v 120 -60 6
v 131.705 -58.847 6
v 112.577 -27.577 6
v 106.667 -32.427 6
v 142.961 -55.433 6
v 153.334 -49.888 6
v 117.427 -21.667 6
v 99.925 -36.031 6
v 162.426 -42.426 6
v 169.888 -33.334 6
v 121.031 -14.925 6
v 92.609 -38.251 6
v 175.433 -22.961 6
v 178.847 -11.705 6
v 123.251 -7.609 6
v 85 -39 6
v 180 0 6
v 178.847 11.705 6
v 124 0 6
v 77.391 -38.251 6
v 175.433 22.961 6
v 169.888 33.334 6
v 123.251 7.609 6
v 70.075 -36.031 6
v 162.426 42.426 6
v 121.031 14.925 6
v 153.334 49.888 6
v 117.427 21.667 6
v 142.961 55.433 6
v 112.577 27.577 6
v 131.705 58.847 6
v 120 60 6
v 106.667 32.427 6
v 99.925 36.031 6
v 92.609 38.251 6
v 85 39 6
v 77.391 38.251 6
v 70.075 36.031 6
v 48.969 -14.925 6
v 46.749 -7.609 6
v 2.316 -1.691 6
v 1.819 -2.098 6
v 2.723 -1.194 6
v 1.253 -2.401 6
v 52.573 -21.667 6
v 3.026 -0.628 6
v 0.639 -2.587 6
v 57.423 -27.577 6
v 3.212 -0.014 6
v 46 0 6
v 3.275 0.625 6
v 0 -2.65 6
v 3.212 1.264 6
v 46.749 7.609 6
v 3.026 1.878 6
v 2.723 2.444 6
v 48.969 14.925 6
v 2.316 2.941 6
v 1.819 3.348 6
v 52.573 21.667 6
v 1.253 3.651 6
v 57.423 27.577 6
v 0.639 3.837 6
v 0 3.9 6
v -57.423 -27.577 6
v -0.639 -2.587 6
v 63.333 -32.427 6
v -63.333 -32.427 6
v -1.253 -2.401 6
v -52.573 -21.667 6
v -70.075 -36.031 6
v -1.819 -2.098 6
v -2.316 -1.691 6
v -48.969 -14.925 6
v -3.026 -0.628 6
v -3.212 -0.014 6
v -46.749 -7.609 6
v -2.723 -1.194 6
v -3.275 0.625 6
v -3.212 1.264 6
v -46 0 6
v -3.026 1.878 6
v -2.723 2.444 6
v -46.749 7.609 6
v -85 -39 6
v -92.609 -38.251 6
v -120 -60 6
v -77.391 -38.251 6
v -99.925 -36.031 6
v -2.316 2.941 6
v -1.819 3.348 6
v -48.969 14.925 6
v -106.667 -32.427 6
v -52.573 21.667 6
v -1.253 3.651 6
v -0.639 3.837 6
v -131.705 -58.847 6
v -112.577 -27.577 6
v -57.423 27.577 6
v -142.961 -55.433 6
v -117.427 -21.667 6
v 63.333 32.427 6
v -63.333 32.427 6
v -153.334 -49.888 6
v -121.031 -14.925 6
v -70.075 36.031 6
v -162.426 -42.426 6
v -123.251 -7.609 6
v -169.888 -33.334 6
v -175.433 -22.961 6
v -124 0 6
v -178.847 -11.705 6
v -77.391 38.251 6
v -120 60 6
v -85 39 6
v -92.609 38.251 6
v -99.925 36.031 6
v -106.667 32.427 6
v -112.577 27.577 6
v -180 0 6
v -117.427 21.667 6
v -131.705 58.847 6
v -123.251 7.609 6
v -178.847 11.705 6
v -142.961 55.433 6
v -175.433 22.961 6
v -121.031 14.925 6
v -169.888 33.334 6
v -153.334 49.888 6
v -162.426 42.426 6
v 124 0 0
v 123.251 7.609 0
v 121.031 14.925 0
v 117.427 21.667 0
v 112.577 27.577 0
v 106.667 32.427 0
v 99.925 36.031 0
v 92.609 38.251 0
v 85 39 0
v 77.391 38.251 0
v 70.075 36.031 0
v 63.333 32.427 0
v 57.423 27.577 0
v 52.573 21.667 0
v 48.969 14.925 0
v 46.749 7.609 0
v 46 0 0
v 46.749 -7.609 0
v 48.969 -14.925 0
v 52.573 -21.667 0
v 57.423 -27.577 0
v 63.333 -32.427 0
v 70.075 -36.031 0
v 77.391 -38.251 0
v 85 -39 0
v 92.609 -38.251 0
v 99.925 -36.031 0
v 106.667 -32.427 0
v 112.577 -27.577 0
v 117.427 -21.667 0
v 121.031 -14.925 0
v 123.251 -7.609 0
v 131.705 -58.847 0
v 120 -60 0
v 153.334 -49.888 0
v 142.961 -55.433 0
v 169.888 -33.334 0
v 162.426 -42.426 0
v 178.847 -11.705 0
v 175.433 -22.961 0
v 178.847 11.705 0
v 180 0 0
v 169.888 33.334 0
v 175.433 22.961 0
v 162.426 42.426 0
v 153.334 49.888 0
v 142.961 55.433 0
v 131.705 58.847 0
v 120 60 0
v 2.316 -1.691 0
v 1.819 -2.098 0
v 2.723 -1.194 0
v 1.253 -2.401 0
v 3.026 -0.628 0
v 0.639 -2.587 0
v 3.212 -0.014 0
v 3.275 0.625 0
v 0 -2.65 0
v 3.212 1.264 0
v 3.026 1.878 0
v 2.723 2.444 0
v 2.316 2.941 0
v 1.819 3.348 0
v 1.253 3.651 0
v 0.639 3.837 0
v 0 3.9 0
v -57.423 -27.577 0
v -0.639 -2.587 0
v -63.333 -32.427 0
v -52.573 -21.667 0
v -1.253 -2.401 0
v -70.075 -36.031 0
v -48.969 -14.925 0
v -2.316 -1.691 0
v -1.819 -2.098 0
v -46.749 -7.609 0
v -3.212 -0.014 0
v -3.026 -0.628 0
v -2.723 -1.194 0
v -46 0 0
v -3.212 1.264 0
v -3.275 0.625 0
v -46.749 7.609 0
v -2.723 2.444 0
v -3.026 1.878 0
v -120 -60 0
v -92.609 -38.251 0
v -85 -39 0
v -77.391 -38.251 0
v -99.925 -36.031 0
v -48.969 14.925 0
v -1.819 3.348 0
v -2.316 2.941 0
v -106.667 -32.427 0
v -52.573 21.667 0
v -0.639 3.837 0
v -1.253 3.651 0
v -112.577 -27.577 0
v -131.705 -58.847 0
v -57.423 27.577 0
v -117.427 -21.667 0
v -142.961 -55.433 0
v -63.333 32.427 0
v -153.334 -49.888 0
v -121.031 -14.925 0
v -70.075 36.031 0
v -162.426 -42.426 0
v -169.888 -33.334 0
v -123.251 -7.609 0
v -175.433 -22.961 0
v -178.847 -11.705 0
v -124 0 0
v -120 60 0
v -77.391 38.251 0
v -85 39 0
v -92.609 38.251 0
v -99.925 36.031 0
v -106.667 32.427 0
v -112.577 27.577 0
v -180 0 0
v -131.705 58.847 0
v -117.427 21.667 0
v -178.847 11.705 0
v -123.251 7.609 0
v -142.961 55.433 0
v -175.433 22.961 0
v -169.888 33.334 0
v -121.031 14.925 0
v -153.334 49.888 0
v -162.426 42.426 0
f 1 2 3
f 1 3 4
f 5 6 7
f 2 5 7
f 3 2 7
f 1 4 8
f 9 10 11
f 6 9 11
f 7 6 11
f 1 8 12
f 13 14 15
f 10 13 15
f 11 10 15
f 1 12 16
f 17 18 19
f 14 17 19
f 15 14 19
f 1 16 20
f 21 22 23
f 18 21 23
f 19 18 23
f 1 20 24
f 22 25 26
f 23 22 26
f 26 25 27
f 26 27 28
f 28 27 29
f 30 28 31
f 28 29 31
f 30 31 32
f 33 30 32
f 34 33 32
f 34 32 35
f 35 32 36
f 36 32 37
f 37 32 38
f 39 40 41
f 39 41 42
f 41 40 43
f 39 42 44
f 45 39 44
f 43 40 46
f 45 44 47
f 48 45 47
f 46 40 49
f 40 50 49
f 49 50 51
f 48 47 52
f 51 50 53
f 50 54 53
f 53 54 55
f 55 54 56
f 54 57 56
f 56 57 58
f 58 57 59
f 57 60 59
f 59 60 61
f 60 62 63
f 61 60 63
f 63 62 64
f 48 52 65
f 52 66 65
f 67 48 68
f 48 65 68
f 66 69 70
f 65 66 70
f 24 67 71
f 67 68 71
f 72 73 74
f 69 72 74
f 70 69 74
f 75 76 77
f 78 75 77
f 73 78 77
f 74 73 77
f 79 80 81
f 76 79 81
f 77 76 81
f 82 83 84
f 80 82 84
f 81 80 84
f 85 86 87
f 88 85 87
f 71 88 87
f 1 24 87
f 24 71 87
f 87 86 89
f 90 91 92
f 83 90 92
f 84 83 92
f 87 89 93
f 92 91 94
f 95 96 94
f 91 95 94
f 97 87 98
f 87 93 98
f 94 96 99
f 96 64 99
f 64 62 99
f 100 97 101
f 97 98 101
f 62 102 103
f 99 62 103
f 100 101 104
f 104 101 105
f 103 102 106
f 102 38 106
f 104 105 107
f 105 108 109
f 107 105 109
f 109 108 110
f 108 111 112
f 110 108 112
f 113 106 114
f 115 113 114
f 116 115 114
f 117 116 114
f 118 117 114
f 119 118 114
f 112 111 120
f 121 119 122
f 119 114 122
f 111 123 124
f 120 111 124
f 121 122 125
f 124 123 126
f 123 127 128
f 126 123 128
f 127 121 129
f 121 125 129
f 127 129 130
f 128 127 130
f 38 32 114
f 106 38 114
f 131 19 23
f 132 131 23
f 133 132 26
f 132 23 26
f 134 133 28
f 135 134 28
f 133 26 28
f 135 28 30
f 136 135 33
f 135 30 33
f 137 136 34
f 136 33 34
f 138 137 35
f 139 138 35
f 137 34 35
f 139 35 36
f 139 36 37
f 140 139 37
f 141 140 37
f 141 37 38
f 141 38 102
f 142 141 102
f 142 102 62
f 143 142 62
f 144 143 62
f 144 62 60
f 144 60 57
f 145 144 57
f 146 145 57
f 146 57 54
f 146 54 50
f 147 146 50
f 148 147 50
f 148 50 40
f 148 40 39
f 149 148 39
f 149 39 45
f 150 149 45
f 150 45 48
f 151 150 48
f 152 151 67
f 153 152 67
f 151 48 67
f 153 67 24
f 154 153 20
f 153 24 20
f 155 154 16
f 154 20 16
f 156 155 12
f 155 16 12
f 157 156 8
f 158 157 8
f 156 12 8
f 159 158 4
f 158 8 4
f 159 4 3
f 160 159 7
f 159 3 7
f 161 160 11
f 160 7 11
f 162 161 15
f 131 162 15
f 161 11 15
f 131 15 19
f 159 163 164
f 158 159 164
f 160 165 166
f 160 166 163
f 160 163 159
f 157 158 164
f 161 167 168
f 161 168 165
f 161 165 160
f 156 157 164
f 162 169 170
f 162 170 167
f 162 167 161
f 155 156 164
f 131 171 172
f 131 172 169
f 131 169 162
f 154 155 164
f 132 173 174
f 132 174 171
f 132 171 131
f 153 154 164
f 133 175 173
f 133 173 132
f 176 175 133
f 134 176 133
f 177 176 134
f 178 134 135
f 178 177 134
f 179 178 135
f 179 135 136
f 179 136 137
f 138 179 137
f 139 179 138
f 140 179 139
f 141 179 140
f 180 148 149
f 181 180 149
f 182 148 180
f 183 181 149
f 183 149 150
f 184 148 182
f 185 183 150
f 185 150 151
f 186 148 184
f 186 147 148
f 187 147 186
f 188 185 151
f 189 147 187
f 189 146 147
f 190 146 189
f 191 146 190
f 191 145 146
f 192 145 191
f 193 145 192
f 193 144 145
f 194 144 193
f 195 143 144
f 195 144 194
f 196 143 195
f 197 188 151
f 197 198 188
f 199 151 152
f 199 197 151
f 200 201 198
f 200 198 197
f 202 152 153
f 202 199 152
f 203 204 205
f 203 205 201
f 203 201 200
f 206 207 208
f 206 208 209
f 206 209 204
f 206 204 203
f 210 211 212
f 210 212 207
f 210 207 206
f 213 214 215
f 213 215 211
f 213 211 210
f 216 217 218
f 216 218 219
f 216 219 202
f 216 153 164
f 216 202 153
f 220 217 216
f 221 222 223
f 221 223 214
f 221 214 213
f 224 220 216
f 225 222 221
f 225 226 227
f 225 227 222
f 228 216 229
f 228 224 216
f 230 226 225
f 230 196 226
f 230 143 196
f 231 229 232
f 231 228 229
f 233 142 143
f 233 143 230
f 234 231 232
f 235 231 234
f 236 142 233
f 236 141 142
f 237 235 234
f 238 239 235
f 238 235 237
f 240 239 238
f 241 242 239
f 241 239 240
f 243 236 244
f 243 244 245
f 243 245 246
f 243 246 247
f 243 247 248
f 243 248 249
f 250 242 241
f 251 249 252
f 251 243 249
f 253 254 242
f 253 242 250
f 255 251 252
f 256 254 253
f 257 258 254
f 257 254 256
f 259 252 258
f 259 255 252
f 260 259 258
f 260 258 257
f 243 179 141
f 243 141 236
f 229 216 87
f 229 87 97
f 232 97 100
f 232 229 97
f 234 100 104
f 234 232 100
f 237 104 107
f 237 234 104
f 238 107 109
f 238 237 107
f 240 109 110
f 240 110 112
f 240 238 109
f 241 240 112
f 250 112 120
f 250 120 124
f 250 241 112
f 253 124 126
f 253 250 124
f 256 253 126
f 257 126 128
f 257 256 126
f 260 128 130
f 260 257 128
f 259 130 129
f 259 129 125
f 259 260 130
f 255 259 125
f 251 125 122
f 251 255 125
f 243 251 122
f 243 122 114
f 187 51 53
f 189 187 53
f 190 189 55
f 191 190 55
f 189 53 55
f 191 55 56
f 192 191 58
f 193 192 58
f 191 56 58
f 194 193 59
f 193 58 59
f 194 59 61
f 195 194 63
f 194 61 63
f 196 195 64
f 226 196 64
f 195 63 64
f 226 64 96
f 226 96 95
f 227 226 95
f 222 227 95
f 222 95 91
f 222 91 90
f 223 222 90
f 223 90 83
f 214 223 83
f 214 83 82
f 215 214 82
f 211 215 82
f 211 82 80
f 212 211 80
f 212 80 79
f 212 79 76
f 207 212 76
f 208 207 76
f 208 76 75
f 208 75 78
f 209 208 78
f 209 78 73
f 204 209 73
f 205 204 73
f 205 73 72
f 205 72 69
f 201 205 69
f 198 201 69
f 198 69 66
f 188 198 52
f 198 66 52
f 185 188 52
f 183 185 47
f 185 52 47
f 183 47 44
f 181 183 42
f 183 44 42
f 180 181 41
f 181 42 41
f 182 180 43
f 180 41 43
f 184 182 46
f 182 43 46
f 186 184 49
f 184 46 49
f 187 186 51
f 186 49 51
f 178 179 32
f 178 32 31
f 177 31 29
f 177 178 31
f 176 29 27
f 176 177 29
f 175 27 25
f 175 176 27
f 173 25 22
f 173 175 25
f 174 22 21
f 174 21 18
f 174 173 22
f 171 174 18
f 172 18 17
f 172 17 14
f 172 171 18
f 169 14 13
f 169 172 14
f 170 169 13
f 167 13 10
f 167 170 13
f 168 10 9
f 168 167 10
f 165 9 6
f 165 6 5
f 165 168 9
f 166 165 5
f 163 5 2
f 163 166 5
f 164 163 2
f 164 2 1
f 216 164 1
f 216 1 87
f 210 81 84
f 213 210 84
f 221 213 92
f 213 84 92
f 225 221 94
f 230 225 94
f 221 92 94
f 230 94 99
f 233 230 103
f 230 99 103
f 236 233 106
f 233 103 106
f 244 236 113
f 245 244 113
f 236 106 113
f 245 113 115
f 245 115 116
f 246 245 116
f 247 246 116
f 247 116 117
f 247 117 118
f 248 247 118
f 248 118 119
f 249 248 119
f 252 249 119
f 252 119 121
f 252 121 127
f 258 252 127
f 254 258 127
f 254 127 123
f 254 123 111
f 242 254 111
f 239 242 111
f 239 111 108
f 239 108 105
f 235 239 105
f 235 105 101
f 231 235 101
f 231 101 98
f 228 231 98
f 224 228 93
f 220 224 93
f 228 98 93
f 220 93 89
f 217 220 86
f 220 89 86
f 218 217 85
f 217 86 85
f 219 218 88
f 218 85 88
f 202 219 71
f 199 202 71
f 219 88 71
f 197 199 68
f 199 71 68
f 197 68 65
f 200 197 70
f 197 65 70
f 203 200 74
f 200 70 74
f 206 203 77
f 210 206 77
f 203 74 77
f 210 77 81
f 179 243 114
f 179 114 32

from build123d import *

# Parameters (mm, degrees)
BOSS_EXTRU_1_DEPTH      = 6
ENL_V_MAT_EXTRU_1_REACH = 191.832
ESQUISSE3_R             = 3.275
ENL_V_MAT_EXTRU_2_REACH = 191.832
ESQUISSE4_R             = 39


with BuildPart() as part:
    # Esquisse2 → Boss.-Extru.1 (new body)
    with BuildSketch(Plane.XY):
        with BuildLine():
            Line((120, -60), (-120, -60))
            ThreePointArc((-120, -60), (-180, 0), (-120, 60))
            Line((-120, 60), (120, 60))
            ThreePointArc((120, 60), (180, 0), (120, -60))
        make_face()
    extrude(amount=BOSS_EXTRU_1_DEPTH)

    # Esquisse3 → Enlèv. mat.-Extru.1 (cut, up to next)
    with BuildSketch(Plane.XY.offset(6), mode=Mode.PRIVATE) as enl_v_mat_extru_1_sk1:
        with Locations((0, 0.625)):
            Circle(ESQUISSE3_R)
    enl_v_mat_extru_1_tool1 = extrude(enl_v_mat_extru_1_sk1.sketch, amount=-ENL_V_MAT_EXTRU_1_REACH, mode=Mode.PRIVATE) & part.part
    add(enl_v_mat_extru_1_tool1.solids().sort_by_distance((0, 0.625, 6))[0], mode=Mode.SUBTRACT)

    # Esquisse4 → Enlèv. mat.-Extru.2 (cut, up to next)
    with BuildSketch(Plane.XY.offset(6), mode=Mode.PRIVATE) as enl_v_mat_extru_2_sk1:
        with Locations((-85, 0)):
            Circle(ESQUISSE4_R)
    enl_v_mat_extru_2_tool1 = extrude(enl_v_mat_extru_2_sk1.sketch, amount=-ENL_V_MAT_EXTRU_2_REACH, mode=Mode.PRIVATE) & part.part
    # Esquisse4 → Enlèv. mat.-Extru.2 (cut, up to next)
    with BuildSketch(Plane.XY.offset(6), mode=Mode.PRIVATE) as enl_v_mat_extru_2_sk2:
        with Locations((85, 0)):
            Circle(ESQUISSE4_R)
    enl_v_mat_extru_2_tool2 = extrude(enl_v_mat_extru_2_sk2.sketch, amount=-ENL_V_MAT_EXTRU_2_REACH, mode=Mode.PRIVATE) & part.part
    add(enl_v_mat_extru_2_tool1.solids().sort_by_distance((-85, 0, 6))[0], mode=Mode.SUBTRACT)
    add(enl_v_mat_extru_2_tool2.solids().sort_by_distance((85, 0, 6))[0], mode=Mode.SUBTRACT)


solid = part.part
